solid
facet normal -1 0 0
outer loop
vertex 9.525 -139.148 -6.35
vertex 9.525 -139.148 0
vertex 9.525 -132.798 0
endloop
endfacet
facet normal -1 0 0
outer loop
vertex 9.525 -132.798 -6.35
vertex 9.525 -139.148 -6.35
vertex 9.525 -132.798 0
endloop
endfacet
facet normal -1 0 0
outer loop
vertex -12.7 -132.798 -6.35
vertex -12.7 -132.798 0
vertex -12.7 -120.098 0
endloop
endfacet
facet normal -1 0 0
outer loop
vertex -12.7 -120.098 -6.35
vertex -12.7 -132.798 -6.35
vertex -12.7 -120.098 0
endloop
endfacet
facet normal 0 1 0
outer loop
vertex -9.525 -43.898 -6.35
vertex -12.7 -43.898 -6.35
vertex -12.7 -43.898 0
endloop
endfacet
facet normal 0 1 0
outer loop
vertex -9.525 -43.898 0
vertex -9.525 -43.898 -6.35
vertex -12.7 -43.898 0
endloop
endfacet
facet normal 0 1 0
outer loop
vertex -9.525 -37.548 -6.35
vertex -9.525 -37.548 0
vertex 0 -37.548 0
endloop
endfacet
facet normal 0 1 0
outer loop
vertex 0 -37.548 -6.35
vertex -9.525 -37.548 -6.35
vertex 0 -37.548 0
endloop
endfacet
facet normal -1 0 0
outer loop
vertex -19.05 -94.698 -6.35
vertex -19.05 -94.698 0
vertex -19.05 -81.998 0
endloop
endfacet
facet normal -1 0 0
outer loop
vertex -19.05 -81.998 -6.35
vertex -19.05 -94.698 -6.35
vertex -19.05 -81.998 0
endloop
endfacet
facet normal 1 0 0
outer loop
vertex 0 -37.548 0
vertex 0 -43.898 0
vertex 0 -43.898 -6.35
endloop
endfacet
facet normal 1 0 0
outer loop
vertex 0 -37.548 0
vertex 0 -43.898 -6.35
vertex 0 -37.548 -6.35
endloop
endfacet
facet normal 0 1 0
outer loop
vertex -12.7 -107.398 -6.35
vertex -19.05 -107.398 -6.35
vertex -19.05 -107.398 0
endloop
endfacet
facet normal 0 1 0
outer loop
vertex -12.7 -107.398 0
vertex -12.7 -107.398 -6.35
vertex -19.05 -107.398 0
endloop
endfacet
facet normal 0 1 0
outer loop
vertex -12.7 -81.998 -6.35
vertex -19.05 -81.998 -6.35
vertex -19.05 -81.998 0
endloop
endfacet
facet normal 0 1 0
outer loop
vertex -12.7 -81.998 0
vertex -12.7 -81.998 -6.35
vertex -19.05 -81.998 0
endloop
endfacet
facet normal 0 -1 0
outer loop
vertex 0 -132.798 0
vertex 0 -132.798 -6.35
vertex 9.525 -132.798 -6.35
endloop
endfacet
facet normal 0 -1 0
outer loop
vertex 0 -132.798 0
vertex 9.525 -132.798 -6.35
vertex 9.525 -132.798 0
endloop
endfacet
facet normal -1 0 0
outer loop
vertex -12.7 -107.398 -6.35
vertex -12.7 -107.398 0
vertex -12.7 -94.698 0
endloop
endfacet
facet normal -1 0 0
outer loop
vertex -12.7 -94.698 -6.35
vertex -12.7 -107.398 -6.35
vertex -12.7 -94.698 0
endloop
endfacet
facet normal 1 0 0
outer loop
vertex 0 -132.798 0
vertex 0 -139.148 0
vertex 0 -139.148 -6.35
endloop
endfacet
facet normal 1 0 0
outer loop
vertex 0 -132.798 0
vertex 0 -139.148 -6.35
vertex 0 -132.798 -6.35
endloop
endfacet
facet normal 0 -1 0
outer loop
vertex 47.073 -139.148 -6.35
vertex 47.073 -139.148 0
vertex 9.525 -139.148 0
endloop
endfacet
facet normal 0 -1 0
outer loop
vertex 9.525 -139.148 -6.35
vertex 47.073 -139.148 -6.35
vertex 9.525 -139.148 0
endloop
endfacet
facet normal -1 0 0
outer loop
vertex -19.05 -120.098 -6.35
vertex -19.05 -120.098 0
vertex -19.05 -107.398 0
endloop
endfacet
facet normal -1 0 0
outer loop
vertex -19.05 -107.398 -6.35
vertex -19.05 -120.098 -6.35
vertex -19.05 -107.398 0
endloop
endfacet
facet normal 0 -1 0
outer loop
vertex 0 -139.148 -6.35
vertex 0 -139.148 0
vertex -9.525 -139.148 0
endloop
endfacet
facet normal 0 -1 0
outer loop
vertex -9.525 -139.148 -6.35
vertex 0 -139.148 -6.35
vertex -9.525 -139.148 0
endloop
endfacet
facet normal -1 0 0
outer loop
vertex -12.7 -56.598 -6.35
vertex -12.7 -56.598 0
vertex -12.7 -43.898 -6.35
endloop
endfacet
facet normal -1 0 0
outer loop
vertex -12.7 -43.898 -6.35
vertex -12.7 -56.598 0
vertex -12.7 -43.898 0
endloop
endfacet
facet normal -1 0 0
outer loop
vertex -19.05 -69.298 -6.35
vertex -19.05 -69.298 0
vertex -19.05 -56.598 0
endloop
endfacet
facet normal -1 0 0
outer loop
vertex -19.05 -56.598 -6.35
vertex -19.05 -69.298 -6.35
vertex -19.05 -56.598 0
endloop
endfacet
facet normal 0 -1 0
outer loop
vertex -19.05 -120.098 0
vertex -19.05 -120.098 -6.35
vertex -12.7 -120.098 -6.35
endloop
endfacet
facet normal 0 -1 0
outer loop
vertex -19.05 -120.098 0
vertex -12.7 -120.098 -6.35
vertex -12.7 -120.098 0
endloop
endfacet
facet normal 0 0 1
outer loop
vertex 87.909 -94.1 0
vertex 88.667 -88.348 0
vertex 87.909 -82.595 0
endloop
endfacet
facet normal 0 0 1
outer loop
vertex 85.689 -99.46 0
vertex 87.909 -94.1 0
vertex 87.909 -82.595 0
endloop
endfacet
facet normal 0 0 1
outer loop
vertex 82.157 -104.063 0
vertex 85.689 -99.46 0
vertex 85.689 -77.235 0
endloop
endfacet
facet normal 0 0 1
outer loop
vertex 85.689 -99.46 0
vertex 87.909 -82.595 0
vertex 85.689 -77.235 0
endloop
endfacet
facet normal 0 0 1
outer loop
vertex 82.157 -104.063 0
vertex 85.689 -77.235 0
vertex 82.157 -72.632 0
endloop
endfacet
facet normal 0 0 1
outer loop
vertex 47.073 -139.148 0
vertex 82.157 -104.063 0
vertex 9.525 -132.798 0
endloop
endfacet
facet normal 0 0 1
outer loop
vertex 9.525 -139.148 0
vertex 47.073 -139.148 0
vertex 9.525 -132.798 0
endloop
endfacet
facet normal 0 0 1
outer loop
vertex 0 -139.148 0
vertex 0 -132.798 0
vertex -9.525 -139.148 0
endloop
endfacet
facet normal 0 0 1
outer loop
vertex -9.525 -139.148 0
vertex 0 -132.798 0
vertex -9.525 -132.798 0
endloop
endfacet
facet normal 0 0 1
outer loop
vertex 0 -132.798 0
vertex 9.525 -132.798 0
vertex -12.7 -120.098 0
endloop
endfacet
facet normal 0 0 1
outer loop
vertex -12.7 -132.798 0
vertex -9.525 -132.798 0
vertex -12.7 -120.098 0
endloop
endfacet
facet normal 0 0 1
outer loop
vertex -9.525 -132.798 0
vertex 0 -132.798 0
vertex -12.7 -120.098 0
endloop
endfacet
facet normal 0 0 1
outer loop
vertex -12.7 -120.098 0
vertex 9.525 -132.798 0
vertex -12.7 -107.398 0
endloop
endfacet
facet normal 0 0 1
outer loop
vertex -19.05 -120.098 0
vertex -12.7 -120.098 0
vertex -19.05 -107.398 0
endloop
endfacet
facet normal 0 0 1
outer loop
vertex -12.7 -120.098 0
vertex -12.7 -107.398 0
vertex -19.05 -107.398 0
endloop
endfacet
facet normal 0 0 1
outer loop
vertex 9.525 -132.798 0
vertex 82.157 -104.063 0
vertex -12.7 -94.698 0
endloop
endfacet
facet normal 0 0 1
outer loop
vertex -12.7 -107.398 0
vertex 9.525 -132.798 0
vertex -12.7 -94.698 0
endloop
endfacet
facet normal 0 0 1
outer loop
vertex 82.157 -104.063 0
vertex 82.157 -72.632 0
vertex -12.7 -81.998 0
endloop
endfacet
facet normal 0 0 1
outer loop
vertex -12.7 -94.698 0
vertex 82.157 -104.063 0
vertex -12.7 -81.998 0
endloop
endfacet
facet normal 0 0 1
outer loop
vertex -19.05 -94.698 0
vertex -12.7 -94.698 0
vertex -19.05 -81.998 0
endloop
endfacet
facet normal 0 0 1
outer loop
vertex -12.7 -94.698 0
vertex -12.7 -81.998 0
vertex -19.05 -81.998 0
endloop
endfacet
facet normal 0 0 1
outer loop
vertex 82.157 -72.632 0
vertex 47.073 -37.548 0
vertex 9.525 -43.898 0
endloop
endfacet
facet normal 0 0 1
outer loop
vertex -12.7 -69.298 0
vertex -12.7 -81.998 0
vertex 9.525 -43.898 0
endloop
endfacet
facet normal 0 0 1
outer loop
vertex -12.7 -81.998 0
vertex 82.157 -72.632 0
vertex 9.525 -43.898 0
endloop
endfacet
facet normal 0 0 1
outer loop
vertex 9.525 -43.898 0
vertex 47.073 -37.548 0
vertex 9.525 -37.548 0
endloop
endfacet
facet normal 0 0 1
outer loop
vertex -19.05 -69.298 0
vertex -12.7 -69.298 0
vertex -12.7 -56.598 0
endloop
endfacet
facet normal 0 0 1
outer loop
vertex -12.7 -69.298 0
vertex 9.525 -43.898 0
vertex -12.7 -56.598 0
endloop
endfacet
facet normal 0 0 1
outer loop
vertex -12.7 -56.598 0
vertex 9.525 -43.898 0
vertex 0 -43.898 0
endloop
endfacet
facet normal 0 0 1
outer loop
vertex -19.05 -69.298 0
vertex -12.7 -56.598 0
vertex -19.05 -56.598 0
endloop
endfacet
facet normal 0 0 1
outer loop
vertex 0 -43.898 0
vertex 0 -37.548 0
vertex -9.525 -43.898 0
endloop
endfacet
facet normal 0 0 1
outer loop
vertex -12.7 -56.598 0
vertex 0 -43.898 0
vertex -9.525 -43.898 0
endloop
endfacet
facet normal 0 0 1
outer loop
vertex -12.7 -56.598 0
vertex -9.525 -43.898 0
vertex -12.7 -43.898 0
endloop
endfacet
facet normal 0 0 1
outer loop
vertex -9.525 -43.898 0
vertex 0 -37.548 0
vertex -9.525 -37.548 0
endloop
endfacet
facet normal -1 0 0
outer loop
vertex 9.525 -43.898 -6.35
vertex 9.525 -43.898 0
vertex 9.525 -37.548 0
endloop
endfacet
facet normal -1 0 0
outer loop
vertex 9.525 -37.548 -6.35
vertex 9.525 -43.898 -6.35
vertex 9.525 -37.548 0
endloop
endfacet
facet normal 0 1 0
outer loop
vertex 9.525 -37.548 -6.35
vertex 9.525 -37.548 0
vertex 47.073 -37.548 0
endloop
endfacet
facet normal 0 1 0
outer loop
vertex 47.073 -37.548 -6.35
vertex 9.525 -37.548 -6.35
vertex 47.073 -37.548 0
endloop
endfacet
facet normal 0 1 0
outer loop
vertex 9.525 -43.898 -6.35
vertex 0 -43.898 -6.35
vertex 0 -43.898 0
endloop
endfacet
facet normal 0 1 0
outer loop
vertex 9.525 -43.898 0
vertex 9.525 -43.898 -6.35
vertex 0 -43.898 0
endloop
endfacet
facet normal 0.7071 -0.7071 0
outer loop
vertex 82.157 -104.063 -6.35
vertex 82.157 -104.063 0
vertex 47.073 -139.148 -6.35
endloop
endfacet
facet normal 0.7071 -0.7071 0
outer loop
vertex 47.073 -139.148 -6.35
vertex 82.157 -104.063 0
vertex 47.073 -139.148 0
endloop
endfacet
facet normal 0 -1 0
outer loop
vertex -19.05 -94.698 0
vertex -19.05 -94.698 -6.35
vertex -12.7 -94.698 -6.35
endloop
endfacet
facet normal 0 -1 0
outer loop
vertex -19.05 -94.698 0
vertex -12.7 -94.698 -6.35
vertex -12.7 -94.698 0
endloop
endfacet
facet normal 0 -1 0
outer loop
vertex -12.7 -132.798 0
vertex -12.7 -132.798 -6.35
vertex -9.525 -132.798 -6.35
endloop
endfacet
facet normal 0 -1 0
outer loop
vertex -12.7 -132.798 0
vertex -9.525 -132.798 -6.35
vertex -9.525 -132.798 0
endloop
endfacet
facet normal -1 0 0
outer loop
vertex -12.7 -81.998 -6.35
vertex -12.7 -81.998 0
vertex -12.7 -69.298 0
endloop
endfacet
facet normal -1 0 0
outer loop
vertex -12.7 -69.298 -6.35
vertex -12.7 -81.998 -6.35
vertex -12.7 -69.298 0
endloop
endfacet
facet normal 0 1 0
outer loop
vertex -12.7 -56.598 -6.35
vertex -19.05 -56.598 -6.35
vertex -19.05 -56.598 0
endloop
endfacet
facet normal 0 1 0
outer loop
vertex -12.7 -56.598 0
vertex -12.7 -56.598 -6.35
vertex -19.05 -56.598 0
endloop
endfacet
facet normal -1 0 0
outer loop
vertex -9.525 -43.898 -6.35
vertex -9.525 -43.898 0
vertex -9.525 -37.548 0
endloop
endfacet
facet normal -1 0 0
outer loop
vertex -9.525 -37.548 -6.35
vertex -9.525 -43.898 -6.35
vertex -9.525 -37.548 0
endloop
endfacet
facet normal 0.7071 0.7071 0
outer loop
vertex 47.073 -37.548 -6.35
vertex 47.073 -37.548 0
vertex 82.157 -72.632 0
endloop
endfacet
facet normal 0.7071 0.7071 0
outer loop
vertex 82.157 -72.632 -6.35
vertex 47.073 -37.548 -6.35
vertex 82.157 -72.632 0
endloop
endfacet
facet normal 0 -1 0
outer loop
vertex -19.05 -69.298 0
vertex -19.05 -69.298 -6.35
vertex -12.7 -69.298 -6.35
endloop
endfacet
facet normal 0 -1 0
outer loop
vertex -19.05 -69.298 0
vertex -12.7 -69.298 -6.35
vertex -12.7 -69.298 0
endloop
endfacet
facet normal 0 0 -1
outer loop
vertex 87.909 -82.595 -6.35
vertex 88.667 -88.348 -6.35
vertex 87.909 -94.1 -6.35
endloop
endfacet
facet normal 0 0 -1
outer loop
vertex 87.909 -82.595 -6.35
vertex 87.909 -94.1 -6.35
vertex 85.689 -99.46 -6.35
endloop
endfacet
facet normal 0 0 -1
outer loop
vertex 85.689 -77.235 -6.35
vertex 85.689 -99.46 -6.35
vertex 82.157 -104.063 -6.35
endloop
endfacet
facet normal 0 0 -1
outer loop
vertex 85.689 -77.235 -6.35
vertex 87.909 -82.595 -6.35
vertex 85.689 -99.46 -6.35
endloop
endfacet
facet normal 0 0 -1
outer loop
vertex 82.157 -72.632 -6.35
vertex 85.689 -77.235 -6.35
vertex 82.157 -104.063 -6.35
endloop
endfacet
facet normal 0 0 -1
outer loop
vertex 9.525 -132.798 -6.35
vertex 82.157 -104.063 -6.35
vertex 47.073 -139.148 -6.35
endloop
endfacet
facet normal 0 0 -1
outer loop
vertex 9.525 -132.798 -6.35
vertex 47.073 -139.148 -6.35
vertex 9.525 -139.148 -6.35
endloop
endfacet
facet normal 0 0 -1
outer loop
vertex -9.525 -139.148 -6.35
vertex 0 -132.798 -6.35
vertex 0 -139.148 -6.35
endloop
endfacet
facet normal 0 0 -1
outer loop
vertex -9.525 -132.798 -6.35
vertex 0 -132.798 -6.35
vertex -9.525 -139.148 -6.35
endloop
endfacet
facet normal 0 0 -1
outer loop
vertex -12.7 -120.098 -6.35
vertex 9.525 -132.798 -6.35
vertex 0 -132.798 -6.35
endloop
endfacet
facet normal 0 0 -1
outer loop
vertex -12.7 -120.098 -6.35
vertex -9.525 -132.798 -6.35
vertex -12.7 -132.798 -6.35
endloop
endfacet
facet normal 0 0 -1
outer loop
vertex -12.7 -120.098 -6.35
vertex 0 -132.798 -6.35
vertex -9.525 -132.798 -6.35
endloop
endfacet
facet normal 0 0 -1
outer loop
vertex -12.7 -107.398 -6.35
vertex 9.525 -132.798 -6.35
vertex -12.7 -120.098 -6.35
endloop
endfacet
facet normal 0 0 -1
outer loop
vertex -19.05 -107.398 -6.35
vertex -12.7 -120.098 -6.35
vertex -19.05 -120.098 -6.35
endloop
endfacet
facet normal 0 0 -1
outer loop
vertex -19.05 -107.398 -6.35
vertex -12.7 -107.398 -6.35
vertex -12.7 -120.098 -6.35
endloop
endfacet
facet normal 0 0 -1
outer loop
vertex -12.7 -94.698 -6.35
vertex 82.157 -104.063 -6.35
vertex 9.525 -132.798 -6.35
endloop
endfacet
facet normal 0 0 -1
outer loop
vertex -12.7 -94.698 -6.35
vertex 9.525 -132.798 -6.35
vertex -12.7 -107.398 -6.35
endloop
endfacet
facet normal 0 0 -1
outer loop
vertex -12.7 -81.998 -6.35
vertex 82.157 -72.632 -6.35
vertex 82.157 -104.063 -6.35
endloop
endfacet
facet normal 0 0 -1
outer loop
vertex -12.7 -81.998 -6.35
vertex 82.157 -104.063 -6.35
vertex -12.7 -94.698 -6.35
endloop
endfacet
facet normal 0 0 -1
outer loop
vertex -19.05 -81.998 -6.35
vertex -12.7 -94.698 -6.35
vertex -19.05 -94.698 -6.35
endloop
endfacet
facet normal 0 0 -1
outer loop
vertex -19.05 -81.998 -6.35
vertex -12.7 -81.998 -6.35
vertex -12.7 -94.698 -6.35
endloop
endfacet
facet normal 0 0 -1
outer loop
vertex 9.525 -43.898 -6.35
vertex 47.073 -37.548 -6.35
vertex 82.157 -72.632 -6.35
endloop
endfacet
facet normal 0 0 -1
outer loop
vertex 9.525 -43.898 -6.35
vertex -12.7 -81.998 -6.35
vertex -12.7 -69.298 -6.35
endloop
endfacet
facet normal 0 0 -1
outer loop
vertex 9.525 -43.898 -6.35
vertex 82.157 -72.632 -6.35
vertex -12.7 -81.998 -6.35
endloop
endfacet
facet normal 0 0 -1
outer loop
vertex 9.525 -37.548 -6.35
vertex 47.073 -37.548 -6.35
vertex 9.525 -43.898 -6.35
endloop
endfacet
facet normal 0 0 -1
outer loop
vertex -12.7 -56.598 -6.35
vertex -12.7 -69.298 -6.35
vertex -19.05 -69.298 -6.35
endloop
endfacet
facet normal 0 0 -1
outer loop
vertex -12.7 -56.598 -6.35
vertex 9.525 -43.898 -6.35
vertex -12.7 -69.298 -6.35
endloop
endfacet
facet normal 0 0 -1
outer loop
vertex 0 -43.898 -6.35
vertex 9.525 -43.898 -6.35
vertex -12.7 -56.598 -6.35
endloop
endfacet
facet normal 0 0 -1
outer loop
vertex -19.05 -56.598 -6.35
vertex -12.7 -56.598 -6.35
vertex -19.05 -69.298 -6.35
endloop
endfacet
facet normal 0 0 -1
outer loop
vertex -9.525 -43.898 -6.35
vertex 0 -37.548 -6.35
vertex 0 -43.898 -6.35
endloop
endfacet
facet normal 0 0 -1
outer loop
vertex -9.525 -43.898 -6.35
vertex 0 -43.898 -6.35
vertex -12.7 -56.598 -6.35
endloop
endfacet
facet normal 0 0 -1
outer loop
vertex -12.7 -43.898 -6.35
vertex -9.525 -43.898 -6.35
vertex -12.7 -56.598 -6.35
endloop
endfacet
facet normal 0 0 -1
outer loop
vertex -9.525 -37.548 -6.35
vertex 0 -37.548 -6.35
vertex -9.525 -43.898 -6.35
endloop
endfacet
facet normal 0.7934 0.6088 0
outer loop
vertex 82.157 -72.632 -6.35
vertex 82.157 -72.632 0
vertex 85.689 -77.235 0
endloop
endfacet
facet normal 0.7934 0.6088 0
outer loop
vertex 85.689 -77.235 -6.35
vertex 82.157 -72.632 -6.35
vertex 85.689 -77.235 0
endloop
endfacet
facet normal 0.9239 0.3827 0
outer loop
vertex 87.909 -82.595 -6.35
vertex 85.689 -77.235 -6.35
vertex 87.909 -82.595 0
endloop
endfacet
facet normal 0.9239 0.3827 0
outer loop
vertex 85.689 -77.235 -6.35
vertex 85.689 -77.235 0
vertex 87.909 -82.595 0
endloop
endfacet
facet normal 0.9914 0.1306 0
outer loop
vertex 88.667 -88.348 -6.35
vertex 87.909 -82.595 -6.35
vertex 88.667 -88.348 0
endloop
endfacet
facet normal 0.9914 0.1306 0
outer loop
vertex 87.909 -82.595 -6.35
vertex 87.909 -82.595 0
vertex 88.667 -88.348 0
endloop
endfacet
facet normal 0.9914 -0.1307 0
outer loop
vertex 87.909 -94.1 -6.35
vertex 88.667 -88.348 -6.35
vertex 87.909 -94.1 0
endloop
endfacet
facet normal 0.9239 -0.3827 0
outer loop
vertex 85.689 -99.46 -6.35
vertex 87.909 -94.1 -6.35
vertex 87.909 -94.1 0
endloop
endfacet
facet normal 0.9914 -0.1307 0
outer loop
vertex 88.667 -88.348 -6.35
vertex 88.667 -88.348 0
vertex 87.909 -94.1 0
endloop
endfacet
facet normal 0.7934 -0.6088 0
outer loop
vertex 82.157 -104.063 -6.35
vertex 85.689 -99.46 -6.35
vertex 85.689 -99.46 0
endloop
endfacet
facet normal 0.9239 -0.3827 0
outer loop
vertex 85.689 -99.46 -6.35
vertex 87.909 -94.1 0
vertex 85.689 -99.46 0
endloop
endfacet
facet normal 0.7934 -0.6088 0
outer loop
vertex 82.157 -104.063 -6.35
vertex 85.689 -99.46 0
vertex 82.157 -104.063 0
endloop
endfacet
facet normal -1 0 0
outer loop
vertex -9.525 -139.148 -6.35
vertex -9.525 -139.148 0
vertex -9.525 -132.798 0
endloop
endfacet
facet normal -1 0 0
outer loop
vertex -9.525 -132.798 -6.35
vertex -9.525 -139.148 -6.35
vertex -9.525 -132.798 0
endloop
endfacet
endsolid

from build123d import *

# Parameters (mm, degrees)
BOSS_EXTRUDE1_DEPTH = 6.35
CAVITY2_START       = -19.05
CAVITY2_OUTLINE_W   = 19.05
CAVITY2_OUTLINE_H   = 6.35
CAVITY2_OUTLINE_W_2 = 12.7
CAVITY2_DEPTH       = 6.350000002
CAVITY2_2_OUTLINE_W = 6.35
CAVITY2_2_OUTLINE_H = 6.35
CAVITY2_2_DEPTH     = 9.525
CAVITY2_START_2     = -12.699999998
CAVITY2_3_OUTLINE_W = 6.35
CAVITY2_3_OUTLINE_H = 6.35
CAVITY2_3_DEPTH     = 3.174999998


# Read off the part's stored shape, not the designer's step: Cavity2
with BuildPart() as part:
    # Sketch1 → Boss-Extrude1 (new body)
    with BuildSketch(Plane.XY):
        with BuildLine():
            Line((-19.05, -37.547541155), (47.072541155, -37.547541155))
            Line((47.072541155, -37.547541155), (82.157092943, -72.632092943))
            ThreePointArc((82.157092943, -72.632092943), (88.666644731, -88.347541155), (82.157092943, -104.062989367))
            Line((82.157092943, -104.062989367), (47.072541155, -139.147541155))
            Line((47.072541155, -139.147541155), (-19.05, -139.147541155))
            Line((-19.05, -139.147541155), (-19.05, -37.547541155))
        make_face()
    extrude(amount=-BOSS_EXTRUDE1_DEPTH)

    # Cavity2 outline → Cavity2 (cut)
    with BuildSketch(Plane.YZ.offset(CAVITY2_START)):
        with Locations((-129.622541155, -3.175)):
            Rectangle(CAVITY2_OUTLINE_W, CAVITY2_OUTLINE_H)
        with Locations((-101.047541155, -3.175)):
            Rectangle(CAVITY2_OUTLINE_W_2, CAVITY2_OUTLINE_H)
        with Locations((-75.647541155, -3.175)):
            Rectangle(CAVITY2_OUTLINE_W_2, CAVITY2_OUTLINE_H)
        with Locations((-47.072541155, -3.175)):
            Rectangle(CAVITY2_OUTLINE_W, CAVITY2_OUTLINE_H)
    extrude(amount=CAVITY2_DEPTH, mode=Mode.SUBTRACT)

    # Cavity2 2 outline → Cavity2 2 (cut)
    with BuildSketch(Plane.YZ):
        with Locations((-135.972541155, -3.175)):
            Rectangle(CAVITY2_2_OUTLINE_W, CAVITY2_2_OUTLINE_H)
        with Locations((-40.722541155, -3.175)):
            Rectangle(CAVITY2_2_OUTLINE_W, CAVITY2_2_OUTLINE_H)
    extrude(amount=CAVITY2_2_DEPTH, mode=Mode.SUBTRACT)

    # Cavity2 3 outline → Cavity2 3 (cut)
    with BuildSketch(Plane.YZ.offset(CAVITY2_START_2)):
        with Locations((-135.972541155, -3.175)):
            Rectangle(CAVITY2_3_OUTLINE_W, CAVITY2_3_OUTLINE_H)
        with Locations((-40.722541155, -3.175)):
            Rectangle(CAVITY2_3_OUTLINE_W, CAVITY2_3_OUTLINE_H)
    extrude(amount=CAVITY2_3_DEPTH, mode=Mode.SUBTRACT)


solid = part.part
